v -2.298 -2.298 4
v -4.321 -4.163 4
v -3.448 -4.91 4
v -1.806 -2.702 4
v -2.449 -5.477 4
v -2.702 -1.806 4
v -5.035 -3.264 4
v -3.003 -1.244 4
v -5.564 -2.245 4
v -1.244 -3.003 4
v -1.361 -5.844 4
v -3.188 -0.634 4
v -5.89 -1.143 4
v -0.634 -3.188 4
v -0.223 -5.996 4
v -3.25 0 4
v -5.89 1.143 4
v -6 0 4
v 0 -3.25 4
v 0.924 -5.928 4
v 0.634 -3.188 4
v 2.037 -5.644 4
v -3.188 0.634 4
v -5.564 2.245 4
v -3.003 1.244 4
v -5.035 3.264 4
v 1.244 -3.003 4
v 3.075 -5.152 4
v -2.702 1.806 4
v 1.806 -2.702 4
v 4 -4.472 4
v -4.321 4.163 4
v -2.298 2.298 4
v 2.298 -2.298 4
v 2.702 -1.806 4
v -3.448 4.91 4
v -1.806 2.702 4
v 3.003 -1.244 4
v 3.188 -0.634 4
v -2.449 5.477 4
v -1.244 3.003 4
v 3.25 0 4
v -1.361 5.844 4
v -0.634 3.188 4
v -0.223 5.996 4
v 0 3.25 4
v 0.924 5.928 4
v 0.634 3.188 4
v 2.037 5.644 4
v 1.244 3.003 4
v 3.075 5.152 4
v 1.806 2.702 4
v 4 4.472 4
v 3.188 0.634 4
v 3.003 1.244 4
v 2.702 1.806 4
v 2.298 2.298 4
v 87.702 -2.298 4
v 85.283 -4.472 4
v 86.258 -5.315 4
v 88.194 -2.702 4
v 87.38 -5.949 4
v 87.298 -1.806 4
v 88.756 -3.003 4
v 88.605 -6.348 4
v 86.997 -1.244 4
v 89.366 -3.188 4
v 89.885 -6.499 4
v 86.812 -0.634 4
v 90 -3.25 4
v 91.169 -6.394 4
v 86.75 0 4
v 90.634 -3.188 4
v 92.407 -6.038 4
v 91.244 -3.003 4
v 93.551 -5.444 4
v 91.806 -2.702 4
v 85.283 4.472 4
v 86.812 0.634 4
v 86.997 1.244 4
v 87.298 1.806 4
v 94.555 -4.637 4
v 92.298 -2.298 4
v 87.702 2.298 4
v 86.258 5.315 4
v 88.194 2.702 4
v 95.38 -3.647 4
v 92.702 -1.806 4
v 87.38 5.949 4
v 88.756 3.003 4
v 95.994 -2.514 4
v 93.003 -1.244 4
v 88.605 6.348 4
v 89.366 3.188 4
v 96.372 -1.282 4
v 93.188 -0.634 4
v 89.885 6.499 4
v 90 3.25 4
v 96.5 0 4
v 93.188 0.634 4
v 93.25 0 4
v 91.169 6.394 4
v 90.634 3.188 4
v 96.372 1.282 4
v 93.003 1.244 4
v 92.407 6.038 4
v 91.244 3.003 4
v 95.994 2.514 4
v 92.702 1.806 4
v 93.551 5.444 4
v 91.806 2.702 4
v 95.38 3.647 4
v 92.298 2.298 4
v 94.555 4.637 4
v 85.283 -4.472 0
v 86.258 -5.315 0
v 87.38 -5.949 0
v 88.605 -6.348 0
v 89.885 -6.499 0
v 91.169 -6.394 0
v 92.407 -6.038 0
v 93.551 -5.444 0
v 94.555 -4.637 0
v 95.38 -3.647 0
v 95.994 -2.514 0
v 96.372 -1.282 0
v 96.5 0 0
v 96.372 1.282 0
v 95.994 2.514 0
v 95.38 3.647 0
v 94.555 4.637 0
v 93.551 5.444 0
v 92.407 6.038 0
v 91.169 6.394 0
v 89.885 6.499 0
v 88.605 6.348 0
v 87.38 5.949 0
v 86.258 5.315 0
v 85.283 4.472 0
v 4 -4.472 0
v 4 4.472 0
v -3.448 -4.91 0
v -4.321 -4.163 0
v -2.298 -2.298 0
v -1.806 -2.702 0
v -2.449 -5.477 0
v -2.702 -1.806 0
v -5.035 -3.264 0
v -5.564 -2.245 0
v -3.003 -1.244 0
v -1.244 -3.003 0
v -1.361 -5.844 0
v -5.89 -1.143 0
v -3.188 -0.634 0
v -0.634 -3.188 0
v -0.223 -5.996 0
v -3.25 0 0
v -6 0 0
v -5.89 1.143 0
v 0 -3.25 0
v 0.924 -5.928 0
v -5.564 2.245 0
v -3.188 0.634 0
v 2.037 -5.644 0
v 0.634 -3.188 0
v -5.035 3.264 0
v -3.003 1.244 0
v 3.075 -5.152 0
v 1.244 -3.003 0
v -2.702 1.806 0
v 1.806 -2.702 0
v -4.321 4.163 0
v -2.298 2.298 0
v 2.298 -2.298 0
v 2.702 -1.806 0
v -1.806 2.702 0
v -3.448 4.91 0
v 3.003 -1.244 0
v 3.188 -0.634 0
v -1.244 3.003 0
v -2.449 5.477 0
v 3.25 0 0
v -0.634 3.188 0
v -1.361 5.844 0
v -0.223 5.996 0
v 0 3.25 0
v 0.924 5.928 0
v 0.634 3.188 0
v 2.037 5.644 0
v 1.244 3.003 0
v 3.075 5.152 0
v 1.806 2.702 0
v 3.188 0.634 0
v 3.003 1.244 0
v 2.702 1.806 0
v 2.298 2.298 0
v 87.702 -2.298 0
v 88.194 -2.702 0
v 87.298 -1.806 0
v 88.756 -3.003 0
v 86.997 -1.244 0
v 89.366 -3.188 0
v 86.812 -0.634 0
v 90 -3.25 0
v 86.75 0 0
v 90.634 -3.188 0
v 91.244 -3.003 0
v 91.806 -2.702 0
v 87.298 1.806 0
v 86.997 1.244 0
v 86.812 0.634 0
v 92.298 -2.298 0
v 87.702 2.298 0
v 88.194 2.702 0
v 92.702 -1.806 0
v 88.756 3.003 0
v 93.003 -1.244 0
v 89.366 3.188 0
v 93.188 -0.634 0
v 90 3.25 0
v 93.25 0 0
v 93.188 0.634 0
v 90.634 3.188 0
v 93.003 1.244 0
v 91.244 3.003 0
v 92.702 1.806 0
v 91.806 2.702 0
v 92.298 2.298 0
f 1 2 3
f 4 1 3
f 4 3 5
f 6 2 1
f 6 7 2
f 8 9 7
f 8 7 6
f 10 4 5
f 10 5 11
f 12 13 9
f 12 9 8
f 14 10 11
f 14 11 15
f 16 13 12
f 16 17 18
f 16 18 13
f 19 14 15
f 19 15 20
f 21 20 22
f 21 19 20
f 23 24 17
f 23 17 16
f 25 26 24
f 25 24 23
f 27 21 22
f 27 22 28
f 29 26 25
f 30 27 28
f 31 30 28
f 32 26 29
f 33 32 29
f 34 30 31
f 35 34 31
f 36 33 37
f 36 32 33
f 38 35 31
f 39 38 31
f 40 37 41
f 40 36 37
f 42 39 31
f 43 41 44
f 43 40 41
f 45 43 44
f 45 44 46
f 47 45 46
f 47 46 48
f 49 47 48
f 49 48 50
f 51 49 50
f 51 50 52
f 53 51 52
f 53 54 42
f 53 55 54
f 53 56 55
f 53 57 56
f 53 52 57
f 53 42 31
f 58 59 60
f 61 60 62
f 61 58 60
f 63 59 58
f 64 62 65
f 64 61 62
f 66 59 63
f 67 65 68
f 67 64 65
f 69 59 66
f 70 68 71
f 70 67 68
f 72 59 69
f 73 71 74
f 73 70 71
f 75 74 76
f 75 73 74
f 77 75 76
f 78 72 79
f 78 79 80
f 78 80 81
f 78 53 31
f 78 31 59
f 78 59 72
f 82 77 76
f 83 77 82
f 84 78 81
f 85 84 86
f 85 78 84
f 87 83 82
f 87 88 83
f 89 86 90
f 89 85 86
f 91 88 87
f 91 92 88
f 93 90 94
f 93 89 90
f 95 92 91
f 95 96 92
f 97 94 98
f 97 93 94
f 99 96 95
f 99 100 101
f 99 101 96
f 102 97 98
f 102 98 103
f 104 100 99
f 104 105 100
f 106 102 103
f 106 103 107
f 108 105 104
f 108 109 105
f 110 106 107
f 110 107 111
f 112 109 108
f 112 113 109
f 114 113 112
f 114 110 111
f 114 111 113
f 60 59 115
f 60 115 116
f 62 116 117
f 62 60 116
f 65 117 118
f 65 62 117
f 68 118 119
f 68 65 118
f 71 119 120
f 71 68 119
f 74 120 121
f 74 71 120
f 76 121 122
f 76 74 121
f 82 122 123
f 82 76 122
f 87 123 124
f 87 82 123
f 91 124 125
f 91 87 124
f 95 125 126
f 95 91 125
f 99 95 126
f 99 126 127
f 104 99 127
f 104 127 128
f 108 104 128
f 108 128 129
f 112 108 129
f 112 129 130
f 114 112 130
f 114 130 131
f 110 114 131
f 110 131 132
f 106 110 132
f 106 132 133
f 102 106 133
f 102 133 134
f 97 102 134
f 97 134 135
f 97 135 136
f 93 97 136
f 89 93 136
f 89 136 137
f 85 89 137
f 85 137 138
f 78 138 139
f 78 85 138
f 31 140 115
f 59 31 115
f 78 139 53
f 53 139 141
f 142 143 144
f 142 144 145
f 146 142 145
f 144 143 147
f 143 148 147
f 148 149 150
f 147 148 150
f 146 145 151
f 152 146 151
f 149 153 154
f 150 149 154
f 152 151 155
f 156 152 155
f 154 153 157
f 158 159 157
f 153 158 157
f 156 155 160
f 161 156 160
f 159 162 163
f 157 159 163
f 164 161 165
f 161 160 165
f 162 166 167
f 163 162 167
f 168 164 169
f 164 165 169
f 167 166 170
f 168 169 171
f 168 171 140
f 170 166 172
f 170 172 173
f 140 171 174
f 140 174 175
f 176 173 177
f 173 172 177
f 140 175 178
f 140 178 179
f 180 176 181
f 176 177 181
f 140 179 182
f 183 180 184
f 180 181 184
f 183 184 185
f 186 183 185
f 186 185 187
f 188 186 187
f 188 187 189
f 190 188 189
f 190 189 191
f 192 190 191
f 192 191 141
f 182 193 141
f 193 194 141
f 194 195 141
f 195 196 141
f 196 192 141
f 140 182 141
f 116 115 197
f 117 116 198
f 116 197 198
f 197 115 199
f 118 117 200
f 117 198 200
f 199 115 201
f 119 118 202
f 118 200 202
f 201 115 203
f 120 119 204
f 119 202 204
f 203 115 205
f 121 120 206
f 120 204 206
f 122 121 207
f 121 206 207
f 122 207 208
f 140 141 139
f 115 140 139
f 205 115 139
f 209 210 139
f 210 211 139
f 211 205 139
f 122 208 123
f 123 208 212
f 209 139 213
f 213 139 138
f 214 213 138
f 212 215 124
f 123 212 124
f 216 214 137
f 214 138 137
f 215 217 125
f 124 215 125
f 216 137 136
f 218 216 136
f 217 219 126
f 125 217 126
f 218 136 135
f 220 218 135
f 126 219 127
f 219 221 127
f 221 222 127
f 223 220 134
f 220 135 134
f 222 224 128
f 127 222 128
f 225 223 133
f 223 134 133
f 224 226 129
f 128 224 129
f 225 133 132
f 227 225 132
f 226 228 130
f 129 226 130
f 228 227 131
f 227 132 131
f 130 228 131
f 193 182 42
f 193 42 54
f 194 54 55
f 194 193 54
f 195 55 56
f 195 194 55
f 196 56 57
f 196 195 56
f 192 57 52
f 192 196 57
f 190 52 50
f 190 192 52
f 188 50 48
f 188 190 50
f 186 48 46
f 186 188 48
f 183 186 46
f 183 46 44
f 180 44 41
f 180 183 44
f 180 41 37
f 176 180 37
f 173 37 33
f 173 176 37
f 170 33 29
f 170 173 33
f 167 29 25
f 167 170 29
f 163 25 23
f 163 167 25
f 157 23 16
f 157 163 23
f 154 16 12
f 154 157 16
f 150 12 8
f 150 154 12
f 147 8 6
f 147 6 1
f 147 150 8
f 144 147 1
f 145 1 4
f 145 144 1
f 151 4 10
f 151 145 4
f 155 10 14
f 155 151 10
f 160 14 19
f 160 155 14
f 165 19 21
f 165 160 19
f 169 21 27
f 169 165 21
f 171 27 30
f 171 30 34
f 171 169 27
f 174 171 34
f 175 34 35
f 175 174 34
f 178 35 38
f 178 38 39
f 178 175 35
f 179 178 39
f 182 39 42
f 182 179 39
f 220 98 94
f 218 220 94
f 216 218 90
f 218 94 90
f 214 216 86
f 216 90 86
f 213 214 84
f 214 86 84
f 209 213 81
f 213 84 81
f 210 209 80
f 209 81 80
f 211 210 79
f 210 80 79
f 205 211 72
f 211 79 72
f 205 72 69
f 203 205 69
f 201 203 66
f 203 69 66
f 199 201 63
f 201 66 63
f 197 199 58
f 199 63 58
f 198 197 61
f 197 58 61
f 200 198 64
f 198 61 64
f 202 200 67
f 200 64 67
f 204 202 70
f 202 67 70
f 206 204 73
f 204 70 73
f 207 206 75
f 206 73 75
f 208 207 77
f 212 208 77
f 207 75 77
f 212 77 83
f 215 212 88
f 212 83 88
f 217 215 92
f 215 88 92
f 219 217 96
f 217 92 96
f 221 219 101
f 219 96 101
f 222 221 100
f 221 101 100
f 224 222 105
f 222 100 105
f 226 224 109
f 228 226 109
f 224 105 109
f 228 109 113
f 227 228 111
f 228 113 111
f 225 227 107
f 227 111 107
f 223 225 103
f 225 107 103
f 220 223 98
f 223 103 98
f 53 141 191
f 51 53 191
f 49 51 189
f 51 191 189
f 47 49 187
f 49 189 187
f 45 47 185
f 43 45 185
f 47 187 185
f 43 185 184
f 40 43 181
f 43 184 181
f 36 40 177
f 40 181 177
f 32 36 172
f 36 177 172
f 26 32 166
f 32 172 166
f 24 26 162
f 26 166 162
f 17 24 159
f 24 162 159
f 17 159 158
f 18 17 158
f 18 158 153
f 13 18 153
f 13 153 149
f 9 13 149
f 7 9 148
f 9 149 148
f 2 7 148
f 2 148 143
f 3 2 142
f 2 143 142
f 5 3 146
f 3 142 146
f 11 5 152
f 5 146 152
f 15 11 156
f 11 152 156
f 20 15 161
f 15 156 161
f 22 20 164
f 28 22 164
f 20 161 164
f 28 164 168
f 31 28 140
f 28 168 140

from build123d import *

# Parameters (mm, degrees)
SKETCH1_R           = 3.25
BOSS_EXTRUDE2_DEPTH = 4
SKETCH2_R           = 6.5
SKETCH2_R_2         = 3.25
BOSS_EXTRUDE3_DEPTH = 4
SKETCH3_R           = 3.25
CUT_EXTRUDE1_DEPTH  = 10


with BuildPart() as part:
    # Sketch1 → Boss-Extrude2 (new body)
    with BuildSketch(Plane.XY):
        with BuildLine():
            Line((4, -4.472135955), (4, 4.472135955))
            ThreePointArc((4, 4.472135955), (-6, 0), (4, -4.472135955))
        make_face()
        Circle(SKETCH1_R, mode=Mode.SUBTRACT)
        with BuildLine():
            ThreePointArc((6, 0), (5.477225575, 2.449489743), (4, 4.472135955))
            Line((4, 4.472135955), (4, -4.472135955))
            ThreePointArc((4, -4.472135955), (5.477225575, -2.449489743), (6, 0))
        make_face()
        with BuildLine():
            Line((90, 4.472135955), (4, 4.472135955))
            ThreePointArc((4, 4.472135955), (5.477225575, 2.449489743), (6, 0))
            ThreePointArc((6, 0), (5.477225575, -2.449489743), (4, -4.472135955))
            Line((4, -4.472135955), (90, -4.472135955))
            Line((90, -4.472135955), (90, 4.472135955))
        make_face()
    extrude(amount=BOSS_EXTRUDE2_DEPTH)

    # Sketch2 → Boss-Extrude3 (add)
    with BuildSketch(Plane.XY.offset(4)):
        with Locations((90, 0)):
            Circle(SKETCH2_R)
        with Locations((90, 0)):
            Circle(SKETCH2_R_2, mode=Mode.SUBTRACT)
    extrude(amount=-BOSS_EXTRUDE3_DEPTH)

    # Sketch3 → Cut-Extrude1 (cut)
    with BuildSketch(Plane.XY.offset(4)):
        with Locations((90, 0)):
            Circle(SKETCH3_R)
    extrude(amount=-CUT_EXTRUDE1_DEPTH, mode=Mode.SUBTRACT)


solid = part.part
